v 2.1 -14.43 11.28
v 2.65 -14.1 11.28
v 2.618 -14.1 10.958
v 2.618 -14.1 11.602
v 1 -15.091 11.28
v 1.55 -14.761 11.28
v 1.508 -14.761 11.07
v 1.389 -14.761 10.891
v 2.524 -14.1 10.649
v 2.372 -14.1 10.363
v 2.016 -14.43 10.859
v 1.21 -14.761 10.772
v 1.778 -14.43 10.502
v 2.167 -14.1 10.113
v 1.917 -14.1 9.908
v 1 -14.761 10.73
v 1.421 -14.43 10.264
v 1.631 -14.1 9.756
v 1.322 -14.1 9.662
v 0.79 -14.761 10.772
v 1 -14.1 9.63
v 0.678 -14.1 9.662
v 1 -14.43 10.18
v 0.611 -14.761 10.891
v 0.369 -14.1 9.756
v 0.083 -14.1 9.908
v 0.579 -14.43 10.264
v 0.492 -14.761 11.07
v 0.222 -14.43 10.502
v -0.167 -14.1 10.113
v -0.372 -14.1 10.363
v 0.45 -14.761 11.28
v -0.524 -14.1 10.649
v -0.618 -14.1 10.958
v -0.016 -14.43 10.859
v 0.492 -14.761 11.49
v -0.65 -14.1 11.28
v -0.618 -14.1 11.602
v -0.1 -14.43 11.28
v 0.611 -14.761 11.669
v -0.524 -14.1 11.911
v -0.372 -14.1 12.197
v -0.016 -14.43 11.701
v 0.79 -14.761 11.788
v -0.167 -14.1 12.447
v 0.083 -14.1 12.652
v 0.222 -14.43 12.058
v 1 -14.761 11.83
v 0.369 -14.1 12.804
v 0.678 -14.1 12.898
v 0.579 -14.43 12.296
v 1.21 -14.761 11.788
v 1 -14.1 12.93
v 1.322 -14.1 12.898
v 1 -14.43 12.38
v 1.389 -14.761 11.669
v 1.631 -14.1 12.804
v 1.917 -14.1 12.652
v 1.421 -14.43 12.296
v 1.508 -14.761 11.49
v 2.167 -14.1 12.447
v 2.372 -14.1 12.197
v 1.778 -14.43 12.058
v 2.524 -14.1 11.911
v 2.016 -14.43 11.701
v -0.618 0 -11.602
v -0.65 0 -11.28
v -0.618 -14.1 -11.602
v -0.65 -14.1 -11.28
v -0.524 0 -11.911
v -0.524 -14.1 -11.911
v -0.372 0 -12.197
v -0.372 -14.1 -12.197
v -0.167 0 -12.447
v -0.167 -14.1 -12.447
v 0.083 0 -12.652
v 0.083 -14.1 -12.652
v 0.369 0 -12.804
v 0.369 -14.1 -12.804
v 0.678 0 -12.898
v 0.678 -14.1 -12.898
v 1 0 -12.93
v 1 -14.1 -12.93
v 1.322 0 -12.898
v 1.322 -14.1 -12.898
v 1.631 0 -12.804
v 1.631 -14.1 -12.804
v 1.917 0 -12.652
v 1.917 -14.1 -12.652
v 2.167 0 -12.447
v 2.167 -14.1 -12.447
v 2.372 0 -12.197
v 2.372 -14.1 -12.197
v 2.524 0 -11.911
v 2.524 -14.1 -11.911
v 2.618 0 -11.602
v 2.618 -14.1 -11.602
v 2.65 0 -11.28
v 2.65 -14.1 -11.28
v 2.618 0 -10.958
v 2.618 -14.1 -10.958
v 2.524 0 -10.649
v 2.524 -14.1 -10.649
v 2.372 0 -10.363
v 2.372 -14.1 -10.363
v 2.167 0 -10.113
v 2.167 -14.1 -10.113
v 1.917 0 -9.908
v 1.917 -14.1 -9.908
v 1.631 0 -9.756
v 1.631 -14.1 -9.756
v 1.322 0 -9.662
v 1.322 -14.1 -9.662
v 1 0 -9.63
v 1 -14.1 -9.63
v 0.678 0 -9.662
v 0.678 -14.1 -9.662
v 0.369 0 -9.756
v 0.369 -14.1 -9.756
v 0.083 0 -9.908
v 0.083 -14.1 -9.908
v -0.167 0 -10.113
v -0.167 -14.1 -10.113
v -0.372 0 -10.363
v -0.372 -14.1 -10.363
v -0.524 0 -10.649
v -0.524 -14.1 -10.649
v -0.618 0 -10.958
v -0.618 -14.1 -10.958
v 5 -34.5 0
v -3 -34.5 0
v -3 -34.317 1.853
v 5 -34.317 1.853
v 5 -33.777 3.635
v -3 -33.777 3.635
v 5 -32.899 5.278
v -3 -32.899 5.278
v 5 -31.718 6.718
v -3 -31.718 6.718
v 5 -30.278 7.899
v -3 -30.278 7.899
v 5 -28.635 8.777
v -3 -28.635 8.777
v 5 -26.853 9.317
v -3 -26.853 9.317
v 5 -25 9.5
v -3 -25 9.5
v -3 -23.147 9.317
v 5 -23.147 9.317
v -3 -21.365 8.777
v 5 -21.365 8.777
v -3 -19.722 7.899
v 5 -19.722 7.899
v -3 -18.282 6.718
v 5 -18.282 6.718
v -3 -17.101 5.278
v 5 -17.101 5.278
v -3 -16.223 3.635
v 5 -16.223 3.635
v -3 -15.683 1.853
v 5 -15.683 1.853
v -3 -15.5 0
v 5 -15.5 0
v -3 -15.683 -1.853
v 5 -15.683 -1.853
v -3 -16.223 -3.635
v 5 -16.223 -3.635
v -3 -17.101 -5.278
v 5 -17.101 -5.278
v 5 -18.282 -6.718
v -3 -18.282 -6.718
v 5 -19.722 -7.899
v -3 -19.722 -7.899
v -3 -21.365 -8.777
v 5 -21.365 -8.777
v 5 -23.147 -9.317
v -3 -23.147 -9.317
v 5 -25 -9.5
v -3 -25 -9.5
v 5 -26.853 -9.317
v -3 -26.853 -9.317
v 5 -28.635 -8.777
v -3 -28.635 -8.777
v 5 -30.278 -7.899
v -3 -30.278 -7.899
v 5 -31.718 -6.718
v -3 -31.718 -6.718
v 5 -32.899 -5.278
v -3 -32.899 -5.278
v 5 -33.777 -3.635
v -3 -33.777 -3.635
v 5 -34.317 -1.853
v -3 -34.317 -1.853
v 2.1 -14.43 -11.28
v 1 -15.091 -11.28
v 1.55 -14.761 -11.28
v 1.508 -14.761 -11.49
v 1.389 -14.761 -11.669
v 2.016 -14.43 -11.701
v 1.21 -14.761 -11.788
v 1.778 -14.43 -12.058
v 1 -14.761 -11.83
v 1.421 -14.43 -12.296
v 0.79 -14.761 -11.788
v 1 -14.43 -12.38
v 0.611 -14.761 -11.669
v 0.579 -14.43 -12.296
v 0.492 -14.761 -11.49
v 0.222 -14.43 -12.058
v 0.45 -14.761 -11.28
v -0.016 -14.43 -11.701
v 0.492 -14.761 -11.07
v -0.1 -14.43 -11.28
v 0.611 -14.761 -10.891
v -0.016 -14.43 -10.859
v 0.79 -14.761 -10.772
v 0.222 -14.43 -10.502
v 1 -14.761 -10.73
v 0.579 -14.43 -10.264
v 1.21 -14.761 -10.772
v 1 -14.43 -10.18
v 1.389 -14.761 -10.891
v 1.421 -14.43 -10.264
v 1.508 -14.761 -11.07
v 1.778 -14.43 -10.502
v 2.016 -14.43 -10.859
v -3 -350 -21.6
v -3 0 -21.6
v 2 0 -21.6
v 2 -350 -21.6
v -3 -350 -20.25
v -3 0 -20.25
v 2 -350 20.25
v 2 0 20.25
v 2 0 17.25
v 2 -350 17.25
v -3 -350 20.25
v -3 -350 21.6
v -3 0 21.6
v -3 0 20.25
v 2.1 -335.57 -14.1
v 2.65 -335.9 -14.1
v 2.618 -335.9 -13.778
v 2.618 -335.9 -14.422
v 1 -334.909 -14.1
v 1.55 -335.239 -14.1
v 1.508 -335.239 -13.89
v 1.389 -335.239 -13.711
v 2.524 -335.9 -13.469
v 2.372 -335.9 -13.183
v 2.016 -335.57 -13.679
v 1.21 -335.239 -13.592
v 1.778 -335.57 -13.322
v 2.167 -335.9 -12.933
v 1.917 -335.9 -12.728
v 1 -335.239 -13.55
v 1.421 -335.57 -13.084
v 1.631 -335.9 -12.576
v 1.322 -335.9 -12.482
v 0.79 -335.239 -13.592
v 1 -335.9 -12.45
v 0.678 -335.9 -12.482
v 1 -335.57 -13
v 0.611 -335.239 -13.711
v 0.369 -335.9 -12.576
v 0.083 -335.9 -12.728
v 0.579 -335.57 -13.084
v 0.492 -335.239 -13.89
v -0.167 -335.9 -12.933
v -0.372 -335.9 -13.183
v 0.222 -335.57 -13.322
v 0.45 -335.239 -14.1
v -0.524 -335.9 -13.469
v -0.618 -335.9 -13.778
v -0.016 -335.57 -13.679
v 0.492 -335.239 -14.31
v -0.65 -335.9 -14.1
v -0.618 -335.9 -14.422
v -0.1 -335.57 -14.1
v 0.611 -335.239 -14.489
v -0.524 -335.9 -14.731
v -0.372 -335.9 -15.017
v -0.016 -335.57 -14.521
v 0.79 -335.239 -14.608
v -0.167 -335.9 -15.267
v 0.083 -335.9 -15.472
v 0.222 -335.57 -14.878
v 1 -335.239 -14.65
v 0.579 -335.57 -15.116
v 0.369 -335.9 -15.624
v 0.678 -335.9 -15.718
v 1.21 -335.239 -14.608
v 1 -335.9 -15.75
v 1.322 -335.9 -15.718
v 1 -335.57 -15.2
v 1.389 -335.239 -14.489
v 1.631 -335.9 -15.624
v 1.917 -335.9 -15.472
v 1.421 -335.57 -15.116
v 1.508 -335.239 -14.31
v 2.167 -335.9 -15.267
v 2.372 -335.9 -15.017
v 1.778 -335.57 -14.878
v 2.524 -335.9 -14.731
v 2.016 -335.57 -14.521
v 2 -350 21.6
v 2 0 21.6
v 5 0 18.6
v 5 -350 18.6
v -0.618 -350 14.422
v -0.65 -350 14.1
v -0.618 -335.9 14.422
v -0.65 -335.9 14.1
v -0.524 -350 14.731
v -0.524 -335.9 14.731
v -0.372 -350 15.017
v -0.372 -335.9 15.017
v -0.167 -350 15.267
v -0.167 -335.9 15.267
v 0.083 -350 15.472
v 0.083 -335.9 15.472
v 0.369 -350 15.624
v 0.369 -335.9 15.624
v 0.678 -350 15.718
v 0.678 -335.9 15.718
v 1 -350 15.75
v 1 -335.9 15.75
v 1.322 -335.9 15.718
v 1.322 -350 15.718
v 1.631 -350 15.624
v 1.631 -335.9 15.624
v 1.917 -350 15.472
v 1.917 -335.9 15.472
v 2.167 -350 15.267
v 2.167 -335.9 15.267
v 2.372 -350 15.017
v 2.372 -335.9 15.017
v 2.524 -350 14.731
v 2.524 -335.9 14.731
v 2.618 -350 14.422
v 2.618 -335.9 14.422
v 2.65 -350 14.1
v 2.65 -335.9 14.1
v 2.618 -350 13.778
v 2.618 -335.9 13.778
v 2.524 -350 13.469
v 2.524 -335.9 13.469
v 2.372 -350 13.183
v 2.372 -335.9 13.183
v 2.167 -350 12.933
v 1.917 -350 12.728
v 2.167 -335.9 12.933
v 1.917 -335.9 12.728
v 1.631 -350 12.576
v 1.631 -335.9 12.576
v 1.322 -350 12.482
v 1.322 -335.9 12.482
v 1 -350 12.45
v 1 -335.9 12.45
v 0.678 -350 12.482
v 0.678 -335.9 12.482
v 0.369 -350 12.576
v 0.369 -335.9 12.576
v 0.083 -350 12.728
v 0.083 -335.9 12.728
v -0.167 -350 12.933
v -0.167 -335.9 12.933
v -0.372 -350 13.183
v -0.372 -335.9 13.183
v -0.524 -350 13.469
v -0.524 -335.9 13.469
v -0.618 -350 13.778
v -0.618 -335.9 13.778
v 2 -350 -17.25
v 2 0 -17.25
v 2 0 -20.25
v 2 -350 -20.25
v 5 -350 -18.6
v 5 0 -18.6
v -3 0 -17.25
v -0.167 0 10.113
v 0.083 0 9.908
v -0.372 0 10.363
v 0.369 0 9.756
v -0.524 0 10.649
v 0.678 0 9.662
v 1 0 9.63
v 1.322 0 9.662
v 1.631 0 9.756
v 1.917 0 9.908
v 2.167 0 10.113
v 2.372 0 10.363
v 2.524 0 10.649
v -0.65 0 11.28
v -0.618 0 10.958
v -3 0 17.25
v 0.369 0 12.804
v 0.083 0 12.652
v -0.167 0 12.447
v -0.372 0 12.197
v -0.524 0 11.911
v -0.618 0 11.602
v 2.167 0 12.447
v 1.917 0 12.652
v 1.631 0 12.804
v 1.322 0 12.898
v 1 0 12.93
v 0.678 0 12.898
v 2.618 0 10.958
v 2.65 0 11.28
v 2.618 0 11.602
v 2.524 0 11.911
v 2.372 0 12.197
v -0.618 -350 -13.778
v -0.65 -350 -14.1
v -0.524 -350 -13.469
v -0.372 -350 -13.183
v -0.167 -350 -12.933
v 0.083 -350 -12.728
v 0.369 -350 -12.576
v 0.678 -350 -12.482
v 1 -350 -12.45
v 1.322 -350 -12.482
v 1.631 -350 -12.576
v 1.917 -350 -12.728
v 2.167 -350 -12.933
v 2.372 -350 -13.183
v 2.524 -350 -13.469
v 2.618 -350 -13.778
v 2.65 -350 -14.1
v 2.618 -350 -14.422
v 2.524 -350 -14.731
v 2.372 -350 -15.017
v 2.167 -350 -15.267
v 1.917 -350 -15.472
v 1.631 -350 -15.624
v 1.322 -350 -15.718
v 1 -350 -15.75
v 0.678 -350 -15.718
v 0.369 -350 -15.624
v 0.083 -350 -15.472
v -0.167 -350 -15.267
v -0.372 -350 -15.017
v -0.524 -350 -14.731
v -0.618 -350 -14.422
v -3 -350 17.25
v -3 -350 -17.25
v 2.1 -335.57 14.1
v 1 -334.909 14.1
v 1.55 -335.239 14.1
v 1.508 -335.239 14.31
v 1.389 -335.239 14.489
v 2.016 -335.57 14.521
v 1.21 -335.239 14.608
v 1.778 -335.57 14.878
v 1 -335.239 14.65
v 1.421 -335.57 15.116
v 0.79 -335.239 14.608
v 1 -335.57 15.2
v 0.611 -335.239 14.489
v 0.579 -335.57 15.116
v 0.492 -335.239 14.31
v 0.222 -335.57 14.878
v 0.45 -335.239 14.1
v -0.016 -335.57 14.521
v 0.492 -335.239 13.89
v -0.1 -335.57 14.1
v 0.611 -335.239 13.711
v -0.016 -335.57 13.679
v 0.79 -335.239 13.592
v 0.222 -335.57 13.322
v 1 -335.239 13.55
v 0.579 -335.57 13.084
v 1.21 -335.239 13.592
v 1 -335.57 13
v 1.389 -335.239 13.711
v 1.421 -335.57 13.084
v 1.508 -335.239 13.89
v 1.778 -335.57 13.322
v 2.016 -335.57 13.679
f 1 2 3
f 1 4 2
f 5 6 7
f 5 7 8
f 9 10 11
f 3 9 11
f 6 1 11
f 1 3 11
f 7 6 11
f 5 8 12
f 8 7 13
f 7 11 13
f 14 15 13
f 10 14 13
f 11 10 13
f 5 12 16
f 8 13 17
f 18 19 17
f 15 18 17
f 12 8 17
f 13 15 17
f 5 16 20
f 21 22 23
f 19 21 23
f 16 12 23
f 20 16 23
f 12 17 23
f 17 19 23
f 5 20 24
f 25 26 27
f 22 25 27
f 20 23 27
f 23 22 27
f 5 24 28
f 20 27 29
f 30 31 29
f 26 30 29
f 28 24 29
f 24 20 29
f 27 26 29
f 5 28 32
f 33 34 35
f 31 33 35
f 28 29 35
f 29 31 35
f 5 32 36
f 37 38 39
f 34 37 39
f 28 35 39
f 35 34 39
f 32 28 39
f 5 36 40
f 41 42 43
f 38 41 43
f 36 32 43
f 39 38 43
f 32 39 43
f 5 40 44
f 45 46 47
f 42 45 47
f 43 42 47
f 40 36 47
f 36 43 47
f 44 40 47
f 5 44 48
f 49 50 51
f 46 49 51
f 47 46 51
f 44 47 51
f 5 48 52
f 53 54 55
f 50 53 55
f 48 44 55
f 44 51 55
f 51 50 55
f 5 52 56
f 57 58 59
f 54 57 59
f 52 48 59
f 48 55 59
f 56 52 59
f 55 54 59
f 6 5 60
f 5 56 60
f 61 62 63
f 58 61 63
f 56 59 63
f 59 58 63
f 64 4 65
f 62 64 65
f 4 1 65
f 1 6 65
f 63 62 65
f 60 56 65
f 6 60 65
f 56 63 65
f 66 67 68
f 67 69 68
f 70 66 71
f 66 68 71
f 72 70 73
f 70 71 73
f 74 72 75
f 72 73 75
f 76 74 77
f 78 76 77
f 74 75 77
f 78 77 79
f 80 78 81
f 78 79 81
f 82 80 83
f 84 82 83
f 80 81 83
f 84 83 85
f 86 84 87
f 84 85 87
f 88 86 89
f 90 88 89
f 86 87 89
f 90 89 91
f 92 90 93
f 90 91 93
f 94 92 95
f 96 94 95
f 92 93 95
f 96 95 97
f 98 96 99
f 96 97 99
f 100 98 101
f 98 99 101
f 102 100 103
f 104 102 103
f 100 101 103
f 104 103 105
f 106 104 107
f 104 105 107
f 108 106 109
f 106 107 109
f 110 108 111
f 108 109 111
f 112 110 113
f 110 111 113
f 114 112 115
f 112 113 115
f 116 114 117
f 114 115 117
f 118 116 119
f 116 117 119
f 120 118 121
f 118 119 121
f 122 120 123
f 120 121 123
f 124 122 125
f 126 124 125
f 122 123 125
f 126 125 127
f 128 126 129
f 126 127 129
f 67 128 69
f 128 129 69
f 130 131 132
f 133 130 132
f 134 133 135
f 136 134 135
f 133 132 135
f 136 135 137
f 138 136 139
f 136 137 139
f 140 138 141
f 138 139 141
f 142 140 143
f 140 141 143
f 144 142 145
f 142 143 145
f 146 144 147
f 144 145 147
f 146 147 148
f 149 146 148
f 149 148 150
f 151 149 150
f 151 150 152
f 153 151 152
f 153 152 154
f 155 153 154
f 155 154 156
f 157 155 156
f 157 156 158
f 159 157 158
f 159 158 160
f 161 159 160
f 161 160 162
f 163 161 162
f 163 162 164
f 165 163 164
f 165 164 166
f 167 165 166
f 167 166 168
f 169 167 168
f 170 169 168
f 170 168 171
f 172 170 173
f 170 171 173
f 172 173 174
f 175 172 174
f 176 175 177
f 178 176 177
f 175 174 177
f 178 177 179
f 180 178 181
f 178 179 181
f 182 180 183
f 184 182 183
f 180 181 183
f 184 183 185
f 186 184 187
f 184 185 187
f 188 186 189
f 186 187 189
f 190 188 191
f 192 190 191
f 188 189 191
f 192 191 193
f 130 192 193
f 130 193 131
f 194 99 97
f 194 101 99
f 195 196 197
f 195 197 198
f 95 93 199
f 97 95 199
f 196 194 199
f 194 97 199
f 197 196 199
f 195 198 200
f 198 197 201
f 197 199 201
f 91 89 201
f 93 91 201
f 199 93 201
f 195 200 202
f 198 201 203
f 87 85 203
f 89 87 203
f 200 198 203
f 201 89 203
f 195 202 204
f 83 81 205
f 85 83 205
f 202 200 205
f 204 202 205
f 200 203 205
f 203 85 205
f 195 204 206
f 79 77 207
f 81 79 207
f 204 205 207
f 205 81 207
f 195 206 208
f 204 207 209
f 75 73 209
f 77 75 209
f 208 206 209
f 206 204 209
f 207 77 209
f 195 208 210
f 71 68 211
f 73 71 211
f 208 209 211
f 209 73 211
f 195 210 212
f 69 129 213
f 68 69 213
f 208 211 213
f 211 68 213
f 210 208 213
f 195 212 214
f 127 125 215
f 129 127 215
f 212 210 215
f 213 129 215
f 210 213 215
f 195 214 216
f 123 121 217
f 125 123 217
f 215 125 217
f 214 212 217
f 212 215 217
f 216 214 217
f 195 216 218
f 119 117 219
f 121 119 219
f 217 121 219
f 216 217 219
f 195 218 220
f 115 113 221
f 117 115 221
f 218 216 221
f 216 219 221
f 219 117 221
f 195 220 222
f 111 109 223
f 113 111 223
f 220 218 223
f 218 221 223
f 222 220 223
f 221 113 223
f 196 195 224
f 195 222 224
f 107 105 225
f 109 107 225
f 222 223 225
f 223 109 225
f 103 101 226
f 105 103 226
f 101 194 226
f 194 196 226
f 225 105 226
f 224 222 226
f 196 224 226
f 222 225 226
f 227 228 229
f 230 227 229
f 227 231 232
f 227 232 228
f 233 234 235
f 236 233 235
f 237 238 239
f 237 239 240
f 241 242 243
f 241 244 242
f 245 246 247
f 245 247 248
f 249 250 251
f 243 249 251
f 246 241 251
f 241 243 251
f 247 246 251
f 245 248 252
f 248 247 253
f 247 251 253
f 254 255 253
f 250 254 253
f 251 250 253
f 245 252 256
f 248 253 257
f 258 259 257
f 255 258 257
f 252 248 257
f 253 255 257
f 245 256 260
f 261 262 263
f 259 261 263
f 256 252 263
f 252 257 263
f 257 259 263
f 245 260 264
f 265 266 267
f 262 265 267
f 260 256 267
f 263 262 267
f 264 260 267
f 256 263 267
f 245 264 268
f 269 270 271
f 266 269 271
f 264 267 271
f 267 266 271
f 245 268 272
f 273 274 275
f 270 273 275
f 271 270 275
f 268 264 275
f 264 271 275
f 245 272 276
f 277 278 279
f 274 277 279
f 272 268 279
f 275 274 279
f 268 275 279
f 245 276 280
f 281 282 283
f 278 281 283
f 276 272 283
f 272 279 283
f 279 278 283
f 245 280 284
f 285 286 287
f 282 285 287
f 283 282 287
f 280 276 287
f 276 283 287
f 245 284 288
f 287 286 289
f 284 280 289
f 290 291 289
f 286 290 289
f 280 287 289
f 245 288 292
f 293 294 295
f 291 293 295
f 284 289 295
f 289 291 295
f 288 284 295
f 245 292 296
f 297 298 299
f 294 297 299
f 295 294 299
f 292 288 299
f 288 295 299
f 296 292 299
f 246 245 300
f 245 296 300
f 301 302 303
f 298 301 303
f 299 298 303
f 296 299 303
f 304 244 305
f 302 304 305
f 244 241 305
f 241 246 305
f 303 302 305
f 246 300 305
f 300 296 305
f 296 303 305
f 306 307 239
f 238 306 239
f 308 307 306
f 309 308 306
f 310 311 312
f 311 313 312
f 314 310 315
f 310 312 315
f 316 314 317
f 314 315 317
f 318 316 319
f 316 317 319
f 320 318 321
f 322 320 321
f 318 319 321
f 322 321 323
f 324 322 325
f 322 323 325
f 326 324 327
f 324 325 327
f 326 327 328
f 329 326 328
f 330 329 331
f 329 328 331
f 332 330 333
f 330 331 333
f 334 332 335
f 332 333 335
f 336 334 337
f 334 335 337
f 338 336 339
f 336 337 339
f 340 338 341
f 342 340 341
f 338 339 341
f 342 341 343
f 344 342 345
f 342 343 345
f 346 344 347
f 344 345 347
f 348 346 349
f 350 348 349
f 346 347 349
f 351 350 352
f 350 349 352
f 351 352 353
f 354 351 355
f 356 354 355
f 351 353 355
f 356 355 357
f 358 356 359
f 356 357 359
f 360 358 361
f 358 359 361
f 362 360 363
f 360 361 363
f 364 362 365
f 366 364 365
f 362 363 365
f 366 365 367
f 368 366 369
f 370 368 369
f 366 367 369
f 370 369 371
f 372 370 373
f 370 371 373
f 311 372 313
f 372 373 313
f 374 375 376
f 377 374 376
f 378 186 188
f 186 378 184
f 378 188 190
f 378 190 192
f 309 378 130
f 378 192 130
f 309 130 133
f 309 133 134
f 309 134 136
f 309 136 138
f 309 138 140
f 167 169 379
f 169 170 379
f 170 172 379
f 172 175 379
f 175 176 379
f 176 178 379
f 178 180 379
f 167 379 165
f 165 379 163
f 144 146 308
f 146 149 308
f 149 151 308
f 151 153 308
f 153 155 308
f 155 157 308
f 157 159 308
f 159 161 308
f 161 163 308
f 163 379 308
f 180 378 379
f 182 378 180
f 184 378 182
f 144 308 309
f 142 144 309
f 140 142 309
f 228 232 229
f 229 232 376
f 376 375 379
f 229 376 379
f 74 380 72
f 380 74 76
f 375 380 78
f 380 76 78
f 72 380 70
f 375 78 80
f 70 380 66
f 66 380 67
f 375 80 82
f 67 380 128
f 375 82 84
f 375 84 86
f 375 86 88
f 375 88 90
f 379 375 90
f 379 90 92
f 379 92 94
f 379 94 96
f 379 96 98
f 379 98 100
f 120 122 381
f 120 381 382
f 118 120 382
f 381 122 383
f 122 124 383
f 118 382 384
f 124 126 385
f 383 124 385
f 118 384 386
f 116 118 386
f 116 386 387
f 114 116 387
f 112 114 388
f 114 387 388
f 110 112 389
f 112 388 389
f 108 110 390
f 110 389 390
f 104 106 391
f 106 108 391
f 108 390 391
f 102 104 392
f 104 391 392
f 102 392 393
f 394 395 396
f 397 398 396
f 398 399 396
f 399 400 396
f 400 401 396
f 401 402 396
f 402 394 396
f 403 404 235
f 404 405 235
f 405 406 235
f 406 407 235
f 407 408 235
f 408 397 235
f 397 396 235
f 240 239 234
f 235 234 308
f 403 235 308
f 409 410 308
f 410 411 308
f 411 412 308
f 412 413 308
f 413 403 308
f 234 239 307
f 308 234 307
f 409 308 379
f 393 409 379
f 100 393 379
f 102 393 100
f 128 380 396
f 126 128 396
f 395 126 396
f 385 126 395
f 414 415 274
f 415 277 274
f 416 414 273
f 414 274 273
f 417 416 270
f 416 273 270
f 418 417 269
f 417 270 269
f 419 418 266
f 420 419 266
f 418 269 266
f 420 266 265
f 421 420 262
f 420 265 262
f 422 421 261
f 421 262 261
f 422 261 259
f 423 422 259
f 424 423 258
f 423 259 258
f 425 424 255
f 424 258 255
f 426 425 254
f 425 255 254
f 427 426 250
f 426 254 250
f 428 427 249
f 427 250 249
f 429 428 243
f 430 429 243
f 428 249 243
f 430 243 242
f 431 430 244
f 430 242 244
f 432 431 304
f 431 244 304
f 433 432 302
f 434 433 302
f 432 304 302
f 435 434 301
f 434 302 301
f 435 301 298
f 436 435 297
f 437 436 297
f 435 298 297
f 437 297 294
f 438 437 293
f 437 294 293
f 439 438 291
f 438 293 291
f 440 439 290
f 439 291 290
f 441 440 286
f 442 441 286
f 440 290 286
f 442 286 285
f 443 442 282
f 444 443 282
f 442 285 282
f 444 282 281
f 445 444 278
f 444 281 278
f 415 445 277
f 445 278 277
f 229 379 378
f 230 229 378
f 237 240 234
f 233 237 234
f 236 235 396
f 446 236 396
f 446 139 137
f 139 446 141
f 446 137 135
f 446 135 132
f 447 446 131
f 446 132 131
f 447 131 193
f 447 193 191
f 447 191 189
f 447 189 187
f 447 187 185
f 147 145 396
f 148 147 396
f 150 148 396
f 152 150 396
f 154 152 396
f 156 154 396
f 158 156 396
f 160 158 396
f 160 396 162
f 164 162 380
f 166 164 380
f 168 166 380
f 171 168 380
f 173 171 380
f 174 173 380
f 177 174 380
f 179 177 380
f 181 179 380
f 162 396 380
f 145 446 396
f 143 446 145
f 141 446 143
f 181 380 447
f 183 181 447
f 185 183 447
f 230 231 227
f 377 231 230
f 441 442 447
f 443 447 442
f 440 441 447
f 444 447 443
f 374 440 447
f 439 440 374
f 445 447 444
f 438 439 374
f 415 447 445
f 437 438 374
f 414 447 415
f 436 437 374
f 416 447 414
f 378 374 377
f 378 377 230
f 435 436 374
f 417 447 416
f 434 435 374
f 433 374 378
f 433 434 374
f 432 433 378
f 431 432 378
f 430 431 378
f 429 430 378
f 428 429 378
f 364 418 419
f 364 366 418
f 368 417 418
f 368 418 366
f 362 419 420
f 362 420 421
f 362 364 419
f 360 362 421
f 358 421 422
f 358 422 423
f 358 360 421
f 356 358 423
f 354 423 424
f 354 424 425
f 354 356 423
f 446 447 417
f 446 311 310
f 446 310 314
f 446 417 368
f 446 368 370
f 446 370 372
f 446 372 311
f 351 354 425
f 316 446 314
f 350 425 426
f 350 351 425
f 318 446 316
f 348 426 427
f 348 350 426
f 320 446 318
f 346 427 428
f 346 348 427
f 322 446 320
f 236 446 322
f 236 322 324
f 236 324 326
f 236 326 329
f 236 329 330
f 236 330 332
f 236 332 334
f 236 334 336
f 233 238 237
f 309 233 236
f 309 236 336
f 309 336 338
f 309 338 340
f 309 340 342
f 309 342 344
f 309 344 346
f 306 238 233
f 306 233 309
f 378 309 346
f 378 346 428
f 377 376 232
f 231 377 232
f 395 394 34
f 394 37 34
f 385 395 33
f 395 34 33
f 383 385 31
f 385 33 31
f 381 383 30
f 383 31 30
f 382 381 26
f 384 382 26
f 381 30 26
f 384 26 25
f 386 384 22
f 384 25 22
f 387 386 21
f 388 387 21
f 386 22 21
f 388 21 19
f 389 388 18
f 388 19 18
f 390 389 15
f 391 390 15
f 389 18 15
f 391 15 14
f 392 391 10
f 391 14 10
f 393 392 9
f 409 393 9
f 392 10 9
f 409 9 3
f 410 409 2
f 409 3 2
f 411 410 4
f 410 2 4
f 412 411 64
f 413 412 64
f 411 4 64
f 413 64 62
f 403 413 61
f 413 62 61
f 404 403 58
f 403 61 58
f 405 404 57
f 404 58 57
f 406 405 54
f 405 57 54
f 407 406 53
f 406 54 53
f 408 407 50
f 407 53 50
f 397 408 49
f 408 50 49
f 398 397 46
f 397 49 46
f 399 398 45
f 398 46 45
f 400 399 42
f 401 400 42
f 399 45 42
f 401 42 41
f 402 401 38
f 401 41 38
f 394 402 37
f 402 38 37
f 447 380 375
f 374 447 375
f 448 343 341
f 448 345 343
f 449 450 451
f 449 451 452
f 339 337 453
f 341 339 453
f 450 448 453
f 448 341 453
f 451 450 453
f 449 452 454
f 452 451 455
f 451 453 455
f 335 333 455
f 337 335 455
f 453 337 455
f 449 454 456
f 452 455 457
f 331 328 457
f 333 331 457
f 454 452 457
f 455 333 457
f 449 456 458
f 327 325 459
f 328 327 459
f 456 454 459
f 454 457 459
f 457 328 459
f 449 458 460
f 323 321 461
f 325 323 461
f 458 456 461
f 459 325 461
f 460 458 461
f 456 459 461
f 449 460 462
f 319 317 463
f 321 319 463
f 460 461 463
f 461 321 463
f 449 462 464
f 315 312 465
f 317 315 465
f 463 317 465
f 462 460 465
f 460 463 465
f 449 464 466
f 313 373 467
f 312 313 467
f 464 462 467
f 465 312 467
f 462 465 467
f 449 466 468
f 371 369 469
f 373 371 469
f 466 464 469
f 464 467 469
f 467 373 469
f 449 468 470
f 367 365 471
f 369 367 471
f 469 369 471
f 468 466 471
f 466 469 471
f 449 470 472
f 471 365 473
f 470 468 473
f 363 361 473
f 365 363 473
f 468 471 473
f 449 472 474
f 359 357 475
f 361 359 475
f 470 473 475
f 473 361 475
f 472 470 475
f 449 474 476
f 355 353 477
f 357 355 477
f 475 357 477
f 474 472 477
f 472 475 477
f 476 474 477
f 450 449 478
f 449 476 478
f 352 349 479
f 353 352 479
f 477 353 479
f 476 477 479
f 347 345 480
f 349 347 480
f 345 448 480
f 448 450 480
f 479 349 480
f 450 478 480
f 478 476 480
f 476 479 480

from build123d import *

# Parameters (mm, degrees)
F1_DEPTH = 350
F2_SIZE  = 3
F4_D     = 19
F6_D     = 3.3
F6_DEPTH = 14.1
F6_TIP   = 0.9914200214
F8_D     = 3.3
F8_DEPTH = 14.1
F8_TIP   = 0.9914200214


with BuildPart() as f1:
    # F0 (on Front) → F1 (new body)
    with BuildSketch(Plane.XZ):
        Polygon((2, 17.25), (-3, 17.25), (-3, -17.25), (2, -17.25), (2, -20.25), (-3, -20.25), (-3, -21.6), (5, -21.6), (5, 21.6), (-3, 21.6), (-3, 20.25), (2, 20.25), align=None)
    extrude(amount=F1_DEPTH)

    # F2
    f2_edges = [f1.edges().sort_by_distance(p)[0] for p in [
        (5, -175, -21.6),
        (5, -175, 21.6),
    ]]
    chamfer(f2_edges, length=F2_SIZE)

    # F4 (through all)
    with Locations(Plane.YZ.offset(5)):
        with Locations((-25, 0)):
            Hole(F4_D / 2)

    # F6
    with Locations(Plane(origin=(0, 0, 0), x_dir=(1, 0, 0), z_dir=(0, 1, 0))):
        with Locations((1, -11.28), (1, 11.28)):
            Hole(F6_D / 2, depth=F6_DEPTH)
            with Locations((0, 0, -(F6_DEPTH + F6_TIP / 2))):  # 118° drill point
                Cone(0, F6_D / 2, F6_TIP, mode=Mode.SUBTRACT)

    # F8
    with Locations(Plane.XZ.offset(350)):
        with Locations((1, 14.1), (1, -14.1)):
            Hole(F8_D / 2, depth=F8_DEPTH)
            with Locations((0, 0, -(F8_DEPTH + F8_TIP / 2))):  # 118° drill point
                Cone(0, F8_D / 2, F8_TIP, mode=Mode.SUBTRACT)


solid = f1.part
